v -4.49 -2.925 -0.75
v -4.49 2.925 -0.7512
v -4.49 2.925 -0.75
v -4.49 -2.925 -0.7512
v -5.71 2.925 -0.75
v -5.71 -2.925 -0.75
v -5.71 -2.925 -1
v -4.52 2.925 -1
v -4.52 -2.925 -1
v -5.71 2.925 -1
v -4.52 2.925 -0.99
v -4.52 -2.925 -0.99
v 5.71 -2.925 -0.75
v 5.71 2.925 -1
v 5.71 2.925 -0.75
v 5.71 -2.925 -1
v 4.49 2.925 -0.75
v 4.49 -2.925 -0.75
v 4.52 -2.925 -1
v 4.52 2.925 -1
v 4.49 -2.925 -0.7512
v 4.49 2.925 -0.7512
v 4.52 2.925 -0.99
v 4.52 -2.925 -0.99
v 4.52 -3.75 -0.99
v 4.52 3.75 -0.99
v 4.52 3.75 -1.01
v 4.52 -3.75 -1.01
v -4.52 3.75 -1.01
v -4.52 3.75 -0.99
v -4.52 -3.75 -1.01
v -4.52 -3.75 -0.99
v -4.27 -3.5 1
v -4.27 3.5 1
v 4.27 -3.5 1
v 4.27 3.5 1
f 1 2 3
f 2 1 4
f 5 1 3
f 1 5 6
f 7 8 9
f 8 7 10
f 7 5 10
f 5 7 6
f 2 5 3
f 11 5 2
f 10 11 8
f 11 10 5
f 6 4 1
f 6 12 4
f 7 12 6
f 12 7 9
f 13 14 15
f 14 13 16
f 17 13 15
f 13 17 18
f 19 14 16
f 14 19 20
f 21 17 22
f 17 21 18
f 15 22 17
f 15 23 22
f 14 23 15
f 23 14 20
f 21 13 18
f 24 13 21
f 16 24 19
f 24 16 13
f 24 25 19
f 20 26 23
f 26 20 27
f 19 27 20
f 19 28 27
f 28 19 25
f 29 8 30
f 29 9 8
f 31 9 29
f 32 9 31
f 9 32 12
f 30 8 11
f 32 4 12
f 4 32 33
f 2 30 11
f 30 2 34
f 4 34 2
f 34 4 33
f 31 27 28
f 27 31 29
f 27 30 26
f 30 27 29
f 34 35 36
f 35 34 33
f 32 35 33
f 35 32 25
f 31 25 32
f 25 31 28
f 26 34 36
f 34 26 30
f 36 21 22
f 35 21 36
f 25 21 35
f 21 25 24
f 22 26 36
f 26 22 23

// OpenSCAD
// SMD package with terminals and slight top chamfer
// Overall target envelope: [11.40, 7.50, 2.00] mm
$fn = 48;

L = 11.40;
W = 7.50;
H = 2.00;

// Terminal geometry (kept within overall envelope)
term_len = 1.20;                 // length along X at each end
term_thk = 0.25;                 // thickness on bottom
term_w   = W * 0.78;             // terminal width along Y

// Small top chamfer (visual detail, still within envelope)
ch = 0.25;                       // chamfer amount
eps = 0.02;                      // overlap to ensure connectivity

module chamfered_body(l, w, h, c){
    // Create a subtle top chamfer by hulling a full-size base with a slightly smaller top
    hull() {
        translate([0,0,-h/2]) cube([l, w, eps], center=true);                 // bottom footprint
        translate([0,0, h/2 - eps/2]) cube([l-2*c, w-2*c, eps], center=true); // top footprint inset
    }
}

union() {
    // Main body (slightly shorter to make room for end terminals, still connected)
    chamfered_body(L - 2*term_len + 2*eps, W, H, ch);

    // Bottom terminals (connected with slight overlap into body)
    for (sx = [-1, 1]) {
        translate([sx*(L/2 - term_len/2), 0, -H/2 + term_thk/2])
            cube([term_len + eps, term_w, term_thk], center=true);
    }
}
